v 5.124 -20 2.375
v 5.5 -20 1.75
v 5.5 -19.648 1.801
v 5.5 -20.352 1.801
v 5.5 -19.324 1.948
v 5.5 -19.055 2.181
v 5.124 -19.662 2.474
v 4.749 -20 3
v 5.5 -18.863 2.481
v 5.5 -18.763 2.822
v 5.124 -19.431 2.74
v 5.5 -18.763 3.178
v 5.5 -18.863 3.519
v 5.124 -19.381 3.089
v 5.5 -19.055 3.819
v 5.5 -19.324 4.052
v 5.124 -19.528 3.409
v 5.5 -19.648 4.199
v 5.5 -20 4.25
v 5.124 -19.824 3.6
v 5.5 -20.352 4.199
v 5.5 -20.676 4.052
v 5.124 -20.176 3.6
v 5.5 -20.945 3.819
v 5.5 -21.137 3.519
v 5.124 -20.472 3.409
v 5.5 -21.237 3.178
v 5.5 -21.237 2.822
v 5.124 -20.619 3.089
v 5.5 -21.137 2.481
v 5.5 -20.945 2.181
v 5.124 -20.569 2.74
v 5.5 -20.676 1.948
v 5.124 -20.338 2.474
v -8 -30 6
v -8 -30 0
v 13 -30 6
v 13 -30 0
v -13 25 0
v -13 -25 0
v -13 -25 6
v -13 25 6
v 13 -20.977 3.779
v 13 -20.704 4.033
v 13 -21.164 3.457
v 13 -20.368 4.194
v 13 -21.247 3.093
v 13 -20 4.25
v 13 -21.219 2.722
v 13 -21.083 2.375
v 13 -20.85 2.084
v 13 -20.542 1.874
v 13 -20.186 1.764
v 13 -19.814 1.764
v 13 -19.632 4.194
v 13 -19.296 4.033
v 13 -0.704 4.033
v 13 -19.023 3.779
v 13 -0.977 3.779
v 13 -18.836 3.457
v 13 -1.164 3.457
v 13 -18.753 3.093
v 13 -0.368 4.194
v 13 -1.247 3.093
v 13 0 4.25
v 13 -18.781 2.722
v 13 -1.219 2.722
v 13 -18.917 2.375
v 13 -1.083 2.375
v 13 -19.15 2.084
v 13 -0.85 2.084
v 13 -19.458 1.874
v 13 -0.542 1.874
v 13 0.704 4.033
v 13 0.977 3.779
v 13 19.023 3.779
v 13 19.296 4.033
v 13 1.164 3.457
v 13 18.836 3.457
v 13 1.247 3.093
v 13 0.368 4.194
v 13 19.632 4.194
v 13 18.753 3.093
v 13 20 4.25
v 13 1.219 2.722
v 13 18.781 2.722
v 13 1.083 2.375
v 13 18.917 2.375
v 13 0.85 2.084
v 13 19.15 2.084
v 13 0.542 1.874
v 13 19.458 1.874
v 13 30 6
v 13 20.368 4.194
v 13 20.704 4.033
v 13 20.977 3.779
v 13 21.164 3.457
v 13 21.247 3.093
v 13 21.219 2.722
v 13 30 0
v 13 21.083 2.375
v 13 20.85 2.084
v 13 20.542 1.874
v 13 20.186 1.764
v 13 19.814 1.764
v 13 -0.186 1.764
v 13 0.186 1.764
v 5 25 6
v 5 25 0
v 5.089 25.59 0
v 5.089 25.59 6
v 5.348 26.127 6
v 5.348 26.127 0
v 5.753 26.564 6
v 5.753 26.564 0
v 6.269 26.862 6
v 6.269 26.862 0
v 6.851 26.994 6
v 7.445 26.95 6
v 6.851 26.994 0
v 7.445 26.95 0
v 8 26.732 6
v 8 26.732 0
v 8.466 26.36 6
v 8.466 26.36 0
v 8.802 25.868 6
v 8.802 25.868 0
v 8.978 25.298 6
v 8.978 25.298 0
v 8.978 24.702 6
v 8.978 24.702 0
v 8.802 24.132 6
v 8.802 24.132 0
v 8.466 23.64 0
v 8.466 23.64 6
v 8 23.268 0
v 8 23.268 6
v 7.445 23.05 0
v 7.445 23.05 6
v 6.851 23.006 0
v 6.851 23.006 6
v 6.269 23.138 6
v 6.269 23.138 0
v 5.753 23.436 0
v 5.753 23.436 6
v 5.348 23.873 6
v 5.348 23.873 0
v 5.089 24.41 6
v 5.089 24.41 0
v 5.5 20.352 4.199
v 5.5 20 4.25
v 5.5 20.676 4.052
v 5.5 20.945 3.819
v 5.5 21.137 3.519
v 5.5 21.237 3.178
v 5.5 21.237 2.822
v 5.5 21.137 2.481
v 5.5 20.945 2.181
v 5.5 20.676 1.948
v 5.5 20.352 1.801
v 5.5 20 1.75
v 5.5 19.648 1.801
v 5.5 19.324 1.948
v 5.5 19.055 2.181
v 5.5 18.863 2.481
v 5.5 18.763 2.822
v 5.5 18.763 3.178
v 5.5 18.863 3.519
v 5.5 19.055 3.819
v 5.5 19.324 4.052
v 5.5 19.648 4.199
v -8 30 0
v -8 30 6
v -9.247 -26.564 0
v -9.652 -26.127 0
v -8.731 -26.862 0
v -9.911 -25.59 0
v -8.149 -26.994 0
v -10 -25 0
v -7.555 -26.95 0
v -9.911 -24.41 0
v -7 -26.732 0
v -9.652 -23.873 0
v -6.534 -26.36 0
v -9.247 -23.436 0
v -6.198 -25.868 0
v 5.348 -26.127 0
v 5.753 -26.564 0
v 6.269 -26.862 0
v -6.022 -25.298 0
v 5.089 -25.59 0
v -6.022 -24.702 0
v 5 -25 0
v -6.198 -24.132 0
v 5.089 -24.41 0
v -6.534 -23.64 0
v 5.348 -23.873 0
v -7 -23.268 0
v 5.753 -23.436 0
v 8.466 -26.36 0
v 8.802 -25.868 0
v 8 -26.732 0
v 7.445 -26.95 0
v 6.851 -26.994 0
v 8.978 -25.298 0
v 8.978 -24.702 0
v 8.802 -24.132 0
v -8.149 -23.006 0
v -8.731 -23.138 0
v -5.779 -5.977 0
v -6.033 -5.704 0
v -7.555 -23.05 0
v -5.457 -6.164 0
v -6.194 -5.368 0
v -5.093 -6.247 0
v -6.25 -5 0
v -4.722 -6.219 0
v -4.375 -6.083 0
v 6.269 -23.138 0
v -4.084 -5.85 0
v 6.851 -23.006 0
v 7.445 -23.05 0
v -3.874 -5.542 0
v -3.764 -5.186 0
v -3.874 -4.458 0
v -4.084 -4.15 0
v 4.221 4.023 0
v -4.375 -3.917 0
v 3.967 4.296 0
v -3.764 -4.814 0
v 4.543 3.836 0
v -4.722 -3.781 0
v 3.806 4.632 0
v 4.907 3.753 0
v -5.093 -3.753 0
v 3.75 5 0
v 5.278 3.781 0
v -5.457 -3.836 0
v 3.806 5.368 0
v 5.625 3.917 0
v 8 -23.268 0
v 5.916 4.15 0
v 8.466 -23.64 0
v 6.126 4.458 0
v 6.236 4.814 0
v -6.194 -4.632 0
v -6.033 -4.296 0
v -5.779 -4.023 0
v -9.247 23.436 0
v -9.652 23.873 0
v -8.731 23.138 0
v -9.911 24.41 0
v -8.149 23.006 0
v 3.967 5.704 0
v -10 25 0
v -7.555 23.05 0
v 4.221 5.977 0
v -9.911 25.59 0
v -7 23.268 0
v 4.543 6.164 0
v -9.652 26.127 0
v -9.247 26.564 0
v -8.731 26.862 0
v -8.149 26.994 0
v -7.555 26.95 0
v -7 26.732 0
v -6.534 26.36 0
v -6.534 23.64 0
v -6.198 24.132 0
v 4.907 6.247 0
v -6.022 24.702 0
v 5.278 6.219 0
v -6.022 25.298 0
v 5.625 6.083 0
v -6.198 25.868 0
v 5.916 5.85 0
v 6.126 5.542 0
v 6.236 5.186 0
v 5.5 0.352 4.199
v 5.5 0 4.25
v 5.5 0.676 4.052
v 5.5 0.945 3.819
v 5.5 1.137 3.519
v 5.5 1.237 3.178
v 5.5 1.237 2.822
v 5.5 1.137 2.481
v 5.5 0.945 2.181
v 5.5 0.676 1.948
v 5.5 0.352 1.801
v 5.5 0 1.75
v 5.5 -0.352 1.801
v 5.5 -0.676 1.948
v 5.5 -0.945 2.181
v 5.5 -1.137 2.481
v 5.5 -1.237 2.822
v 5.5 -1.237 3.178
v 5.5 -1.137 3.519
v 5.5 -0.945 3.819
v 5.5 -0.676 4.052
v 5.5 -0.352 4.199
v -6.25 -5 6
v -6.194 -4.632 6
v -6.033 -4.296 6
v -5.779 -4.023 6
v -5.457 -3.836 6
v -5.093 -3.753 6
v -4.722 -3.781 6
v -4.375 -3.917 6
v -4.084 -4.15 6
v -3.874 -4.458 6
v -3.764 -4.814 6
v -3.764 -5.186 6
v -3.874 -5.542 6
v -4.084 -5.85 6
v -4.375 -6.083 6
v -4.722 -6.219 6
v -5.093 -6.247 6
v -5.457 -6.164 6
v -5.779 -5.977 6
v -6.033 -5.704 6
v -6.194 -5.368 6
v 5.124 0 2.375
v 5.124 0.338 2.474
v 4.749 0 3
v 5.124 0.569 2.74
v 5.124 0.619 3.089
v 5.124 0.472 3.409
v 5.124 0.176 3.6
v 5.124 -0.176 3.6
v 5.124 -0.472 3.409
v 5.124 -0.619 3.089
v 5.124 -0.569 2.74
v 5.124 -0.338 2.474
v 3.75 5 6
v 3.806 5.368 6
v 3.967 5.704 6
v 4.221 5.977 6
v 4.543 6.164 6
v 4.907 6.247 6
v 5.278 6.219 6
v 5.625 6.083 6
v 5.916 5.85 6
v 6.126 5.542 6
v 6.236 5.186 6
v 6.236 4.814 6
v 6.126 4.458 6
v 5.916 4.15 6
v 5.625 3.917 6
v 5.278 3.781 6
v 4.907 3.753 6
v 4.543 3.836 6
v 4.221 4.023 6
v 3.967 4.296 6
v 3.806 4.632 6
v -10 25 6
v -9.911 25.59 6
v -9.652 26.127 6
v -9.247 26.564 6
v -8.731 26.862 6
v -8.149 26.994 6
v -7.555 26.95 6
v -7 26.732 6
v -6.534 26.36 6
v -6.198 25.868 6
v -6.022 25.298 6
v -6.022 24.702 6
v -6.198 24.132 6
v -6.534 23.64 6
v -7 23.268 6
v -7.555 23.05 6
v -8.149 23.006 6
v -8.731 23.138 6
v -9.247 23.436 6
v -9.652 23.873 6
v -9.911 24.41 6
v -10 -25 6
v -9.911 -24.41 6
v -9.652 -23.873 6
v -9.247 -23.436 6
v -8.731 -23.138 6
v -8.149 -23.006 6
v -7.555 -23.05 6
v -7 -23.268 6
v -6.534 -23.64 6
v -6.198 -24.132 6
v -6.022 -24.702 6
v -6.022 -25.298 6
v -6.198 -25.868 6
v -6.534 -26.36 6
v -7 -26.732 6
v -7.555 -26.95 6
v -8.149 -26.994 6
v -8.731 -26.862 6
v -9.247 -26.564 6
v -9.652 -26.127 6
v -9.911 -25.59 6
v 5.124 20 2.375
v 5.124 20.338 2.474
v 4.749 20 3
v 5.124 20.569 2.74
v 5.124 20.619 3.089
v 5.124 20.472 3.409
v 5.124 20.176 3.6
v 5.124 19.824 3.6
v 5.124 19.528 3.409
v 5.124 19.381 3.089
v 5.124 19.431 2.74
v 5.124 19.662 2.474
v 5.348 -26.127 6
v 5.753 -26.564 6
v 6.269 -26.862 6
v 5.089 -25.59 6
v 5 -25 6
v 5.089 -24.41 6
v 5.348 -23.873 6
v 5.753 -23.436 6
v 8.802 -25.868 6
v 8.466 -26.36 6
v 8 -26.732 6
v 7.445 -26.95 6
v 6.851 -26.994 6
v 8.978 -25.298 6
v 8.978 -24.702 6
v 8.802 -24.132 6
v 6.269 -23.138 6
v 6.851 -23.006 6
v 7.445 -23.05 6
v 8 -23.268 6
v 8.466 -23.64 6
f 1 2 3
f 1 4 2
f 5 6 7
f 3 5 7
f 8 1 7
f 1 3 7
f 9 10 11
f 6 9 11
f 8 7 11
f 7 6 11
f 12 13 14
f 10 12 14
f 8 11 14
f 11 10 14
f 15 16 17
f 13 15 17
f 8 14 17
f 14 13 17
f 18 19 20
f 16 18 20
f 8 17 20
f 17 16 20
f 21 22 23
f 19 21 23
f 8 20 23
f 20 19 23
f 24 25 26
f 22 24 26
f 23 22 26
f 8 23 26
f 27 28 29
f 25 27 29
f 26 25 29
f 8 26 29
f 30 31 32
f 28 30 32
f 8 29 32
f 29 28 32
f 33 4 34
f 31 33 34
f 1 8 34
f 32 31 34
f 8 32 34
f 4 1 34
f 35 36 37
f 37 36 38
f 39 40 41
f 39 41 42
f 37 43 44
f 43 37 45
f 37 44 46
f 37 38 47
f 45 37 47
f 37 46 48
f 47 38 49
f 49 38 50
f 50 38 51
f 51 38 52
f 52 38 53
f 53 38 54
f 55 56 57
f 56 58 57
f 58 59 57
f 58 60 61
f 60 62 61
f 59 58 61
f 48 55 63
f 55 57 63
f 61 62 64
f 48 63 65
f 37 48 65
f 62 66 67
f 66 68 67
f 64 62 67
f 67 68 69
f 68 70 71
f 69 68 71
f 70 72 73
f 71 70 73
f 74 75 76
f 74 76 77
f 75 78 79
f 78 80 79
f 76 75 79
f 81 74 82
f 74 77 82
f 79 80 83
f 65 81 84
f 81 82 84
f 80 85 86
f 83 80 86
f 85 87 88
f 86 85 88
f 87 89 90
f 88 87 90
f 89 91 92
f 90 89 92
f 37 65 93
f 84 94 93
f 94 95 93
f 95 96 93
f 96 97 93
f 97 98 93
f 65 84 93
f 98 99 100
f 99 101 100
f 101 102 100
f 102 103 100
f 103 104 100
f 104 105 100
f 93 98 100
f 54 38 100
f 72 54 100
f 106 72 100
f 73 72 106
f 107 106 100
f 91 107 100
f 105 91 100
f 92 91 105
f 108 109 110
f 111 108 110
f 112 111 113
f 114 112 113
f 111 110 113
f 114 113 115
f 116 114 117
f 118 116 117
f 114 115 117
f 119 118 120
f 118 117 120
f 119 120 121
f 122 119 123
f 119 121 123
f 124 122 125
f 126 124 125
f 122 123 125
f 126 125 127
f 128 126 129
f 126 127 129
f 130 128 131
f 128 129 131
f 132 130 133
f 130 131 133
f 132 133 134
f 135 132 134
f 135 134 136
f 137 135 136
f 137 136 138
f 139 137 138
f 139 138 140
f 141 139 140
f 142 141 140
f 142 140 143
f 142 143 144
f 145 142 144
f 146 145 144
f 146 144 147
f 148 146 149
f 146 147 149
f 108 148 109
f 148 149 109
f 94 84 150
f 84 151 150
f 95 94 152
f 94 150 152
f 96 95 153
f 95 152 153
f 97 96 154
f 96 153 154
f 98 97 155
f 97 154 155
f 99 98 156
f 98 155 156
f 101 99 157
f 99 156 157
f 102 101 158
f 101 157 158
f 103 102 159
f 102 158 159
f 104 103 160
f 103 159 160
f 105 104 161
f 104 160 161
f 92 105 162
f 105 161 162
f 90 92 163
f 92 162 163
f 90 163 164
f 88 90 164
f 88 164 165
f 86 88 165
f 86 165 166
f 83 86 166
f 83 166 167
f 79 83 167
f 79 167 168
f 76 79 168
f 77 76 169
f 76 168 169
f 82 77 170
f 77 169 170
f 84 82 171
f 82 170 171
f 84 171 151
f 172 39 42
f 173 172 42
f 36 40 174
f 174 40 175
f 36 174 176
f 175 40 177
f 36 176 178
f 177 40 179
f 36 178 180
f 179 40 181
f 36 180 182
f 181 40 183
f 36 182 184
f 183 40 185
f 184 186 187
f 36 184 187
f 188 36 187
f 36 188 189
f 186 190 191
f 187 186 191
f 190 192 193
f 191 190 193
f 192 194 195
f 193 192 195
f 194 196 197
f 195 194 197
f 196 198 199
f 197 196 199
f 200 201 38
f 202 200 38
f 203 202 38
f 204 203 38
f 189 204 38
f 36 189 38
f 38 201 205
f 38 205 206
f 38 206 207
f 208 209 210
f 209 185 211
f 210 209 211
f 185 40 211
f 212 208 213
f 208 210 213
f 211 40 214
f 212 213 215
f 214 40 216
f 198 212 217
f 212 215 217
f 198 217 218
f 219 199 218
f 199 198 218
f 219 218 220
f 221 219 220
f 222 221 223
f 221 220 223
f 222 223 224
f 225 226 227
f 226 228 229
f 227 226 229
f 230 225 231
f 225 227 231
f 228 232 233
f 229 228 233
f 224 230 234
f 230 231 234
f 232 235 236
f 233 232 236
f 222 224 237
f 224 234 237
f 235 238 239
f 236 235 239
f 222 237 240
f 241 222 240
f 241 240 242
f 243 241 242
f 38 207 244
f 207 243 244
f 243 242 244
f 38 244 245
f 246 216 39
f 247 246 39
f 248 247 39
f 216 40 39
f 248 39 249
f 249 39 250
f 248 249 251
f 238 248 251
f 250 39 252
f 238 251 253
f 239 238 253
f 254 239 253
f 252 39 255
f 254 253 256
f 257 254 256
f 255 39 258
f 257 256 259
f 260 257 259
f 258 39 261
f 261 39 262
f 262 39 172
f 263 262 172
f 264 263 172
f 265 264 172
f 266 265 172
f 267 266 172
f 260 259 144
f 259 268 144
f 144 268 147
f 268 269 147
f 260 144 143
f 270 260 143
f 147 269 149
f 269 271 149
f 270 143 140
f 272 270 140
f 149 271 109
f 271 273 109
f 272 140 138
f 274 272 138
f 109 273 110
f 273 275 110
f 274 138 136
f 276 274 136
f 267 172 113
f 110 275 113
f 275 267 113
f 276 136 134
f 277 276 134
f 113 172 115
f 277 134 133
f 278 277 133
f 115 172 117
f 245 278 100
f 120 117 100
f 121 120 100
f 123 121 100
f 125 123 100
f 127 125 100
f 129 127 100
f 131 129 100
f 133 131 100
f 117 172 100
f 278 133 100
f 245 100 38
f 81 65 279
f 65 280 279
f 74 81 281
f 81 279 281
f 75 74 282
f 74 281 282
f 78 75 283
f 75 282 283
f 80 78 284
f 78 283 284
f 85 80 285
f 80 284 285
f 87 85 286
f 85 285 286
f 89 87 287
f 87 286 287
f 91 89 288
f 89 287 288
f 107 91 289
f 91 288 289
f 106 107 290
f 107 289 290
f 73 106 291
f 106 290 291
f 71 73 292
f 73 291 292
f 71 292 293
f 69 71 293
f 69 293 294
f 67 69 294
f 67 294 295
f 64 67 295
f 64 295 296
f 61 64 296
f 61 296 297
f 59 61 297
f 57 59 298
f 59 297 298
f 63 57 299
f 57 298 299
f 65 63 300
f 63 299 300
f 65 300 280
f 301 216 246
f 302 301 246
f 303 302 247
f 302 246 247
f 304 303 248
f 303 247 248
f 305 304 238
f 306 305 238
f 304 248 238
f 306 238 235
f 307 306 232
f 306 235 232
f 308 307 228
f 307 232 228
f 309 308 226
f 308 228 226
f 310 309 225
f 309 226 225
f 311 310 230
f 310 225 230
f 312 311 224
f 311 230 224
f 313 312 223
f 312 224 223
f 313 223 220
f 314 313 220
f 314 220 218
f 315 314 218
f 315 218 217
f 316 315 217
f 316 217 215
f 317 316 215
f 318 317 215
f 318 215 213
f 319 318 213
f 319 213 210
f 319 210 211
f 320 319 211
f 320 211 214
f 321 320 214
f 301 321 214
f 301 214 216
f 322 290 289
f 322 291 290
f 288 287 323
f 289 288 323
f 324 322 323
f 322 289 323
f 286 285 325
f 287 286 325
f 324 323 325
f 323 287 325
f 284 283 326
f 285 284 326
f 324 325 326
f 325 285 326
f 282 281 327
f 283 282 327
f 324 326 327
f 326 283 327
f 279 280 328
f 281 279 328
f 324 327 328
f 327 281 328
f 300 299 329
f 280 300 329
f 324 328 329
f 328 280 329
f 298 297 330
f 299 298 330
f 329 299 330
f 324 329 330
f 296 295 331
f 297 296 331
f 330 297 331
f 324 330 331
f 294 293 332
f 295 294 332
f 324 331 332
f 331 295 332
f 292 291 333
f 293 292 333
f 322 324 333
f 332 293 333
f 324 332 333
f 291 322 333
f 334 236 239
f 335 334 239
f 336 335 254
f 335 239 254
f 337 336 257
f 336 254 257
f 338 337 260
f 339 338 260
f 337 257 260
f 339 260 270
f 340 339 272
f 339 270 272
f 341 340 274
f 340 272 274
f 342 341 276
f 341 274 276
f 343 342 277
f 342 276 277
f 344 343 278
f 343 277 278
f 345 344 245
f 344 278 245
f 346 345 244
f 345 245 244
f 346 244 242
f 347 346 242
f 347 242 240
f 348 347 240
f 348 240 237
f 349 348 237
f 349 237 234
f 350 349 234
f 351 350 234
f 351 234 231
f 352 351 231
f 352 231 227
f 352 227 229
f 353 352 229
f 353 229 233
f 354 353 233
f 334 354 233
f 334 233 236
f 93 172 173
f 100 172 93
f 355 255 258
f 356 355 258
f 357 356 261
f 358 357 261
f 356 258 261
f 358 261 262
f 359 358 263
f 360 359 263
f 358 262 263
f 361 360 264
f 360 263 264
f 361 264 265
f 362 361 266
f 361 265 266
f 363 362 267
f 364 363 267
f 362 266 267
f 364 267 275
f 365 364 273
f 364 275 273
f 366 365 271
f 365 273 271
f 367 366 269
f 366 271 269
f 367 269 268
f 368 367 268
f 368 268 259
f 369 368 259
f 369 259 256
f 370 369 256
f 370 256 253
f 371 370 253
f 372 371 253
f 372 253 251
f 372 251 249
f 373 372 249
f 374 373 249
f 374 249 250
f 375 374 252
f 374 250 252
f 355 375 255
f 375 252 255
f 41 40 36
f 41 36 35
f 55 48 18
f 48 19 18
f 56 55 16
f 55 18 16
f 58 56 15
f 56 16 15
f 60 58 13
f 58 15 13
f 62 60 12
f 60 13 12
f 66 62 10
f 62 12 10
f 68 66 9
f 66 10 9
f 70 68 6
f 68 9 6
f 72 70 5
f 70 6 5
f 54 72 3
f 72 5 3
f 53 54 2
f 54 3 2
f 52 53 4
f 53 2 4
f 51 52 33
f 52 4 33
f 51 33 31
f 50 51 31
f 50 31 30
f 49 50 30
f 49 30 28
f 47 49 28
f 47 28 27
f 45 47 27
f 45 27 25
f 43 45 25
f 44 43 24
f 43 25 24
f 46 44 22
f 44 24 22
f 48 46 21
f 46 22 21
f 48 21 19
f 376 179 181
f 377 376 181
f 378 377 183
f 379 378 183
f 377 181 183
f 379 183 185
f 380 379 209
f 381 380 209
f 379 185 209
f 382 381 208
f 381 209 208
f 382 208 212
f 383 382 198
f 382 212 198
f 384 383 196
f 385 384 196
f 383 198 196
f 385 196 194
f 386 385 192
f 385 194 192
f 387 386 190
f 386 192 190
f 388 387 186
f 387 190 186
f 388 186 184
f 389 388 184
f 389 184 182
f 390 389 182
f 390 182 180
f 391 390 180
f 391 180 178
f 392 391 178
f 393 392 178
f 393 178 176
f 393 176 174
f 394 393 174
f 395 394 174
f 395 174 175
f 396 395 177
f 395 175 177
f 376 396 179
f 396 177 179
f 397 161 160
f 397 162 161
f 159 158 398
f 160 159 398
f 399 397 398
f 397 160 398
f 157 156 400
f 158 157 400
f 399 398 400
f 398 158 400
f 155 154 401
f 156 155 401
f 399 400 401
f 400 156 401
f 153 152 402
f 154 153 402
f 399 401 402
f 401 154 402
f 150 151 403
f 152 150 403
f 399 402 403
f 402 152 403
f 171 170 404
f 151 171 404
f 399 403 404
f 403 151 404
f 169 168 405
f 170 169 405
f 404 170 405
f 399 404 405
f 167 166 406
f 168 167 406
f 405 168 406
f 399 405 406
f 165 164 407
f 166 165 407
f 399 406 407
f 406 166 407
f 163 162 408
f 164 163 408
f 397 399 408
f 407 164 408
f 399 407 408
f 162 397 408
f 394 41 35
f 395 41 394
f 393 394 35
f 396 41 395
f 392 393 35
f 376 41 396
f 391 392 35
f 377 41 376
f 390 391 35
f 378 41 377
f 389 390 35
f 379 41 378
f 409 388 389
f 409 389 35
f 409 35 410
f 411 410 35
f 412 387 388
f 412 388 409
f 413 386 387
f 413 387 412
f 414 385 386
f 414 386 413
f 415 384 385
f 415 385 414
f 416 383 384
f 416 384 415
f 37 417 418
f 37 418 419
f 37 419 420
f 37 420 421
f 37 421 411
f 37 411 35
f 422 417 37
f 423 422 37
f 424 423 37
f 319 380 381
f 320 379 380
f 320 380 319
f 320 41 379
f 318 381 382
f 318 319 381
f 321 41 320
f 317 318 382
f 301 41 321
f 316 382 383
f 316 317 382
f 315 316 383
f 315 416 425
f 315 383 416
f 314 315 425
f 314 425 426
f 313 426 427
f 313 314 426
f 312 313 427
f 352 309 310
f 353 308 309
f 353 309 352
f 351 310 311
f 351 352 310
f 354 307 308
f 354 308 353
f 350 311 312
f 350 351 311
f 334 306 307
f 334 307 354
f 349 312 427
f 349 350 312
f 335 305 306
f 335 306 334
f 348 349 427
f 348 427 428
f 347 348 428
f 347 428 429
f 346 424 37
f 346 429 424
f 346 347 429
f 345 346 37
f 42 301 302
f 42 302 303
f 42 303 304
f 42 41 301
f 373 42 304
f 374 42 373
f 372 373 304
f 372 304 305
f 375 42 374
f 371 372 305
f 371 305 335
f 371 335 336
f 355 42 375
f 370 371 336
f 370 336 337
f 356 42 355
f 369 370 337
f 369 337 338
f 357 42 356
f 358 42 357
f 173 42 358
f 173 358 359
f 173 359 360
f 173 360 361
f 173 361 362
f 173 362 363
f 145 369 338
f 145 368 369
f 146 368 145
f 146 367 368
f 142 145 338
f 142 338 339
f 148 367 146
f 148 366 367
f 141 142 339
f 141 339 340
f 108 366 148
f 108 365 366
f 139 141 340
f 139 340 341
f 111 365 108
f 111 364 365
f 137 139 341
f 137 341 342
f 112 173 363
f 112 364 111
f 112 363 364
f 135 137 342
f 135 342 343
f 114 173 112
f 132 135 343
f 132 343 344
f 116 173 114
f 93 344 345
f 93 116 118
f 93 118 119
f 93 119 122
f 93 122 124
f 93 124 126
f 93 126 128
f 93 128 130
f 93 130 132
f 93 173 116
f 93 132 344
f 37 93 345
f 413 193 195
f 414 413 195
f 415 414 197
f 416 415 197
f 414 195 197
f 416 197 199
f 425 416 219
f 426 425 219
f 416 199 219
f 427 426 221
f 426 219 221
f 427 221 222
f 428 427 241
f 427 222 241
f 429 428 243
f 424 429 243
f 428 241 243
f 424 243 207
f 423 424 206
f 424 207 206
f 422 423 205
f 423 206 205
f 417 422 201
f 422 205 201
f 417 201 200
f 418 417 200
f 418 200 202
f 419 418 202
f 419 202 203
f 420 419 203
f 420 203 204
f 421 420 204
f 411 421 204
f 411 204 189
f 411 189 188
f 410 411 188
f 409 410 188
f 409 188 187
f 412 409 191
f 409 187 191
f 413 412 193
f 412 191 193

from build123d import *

# Parameters (mm, degrees)
SKETCH_1_W             = 26
SKETCH_1_H             = 60
EXTRUDE_1_DEPTH        = 6
SKETCH_2_R             = 2
CUT_EXTRUDE_1_DEPTH    = 6
HOLE_WIZARD_M3_1_D     = 2.5
HOLE_WIZARD_M3_1_DEPTH = 7.5
HOLE_WIZARD_M3_1_TIP   = 0.751075774
CHAMFER_1_SIZE         = 5
HOLE_WIZARD_M3_2_D     = 2.5
HOLE_WIZARD_M3_2_DEPTH = 7.5
HOLE_WIZARD_M3_2_TIP   = 0.751075774


with BuildPart() as part:
    # 草图1 → 凸台-拉伸1 (new body)
    with BuildSketch(Plane.XY):
        Rectangle(SKETCH_1_W, SKETCH_1_H)
    extrude(amount=EXTRUDE_1_DEPTH)

    # 草图2 → 切除-拉伸1 (cut)
    with BuildSketch(Plane(origin=(0, 0, 0), x_dir=(-1, 0, 0), z_dir=(0, 0, -1))):
        with Locations((8, -25)):
            Circle(SKETCH_2_R)
        with Locations((-7, -25)):
            Circle(SKETCH_2_R)
        with Locations((8, 25)):
            Circle(SKETCH_2_R)
        with Locations((-7, 25)):
            Circle(SKETCH_2_R)
    extrude(amount=-CUT_EXTRUDE_1_DEPTH, mode=Mode.SUBTRACT)

    # M3 螺纹孔1
    with Locations(Plane(origin=(13, 0, 0), x_dir=(0, 0, -1), z_dir=(1, 0, 0))):
        with Locations((-3, 20), (-3, 0), (-3, -20)):
            Hole(HOLE_WIZARD_M3_1_D / 2, depth=HOLE_WIZARD_M3_1_DEPTH)
            with Locations((0, 0, -(HOLE_WIZARD_M3_1_DEPTH + HOLE_WIZARD_M3_1_TIP / 2))):  # 118° drill point
                Cone(0, HOLE_WIZARD_M3_1_D / 2, HOLE_WIZARD_M3_1_TIP, mode=Mode.SUBTRACT)

    # 倒角1
    chamfer_1_edges = [part.edges().sort_by_distance(p)[0] for p in [
        (-13, 30, 3),
        (-13, -30, 3),
    ]]
    chamfer(chamfer_1_edges, length=CHAMFER_1_SIZE)

    # M3 螺纹孔2
    with Locations(Plane.XY.offset(6)):
        with Locations((5, 5), (-5, -5)):
            Hole(HOLE_WIZARD_M3_2_D / 2, depth=HOLE_WIZARD_M3_2_DEPTH)
            with Locations((0, 0, -(HOLE_WIZARD_M3_2_DEPTH + HOLE_WIZARD_M3_2_TIP / 2))):  # 118° drill point
                Cone(0, HOLE_WIZARD_M3_2_D / 2, HOLE_WIZARD_M3_2_TIP, mode=Mode.SUBTRACT)


solid = part.part
